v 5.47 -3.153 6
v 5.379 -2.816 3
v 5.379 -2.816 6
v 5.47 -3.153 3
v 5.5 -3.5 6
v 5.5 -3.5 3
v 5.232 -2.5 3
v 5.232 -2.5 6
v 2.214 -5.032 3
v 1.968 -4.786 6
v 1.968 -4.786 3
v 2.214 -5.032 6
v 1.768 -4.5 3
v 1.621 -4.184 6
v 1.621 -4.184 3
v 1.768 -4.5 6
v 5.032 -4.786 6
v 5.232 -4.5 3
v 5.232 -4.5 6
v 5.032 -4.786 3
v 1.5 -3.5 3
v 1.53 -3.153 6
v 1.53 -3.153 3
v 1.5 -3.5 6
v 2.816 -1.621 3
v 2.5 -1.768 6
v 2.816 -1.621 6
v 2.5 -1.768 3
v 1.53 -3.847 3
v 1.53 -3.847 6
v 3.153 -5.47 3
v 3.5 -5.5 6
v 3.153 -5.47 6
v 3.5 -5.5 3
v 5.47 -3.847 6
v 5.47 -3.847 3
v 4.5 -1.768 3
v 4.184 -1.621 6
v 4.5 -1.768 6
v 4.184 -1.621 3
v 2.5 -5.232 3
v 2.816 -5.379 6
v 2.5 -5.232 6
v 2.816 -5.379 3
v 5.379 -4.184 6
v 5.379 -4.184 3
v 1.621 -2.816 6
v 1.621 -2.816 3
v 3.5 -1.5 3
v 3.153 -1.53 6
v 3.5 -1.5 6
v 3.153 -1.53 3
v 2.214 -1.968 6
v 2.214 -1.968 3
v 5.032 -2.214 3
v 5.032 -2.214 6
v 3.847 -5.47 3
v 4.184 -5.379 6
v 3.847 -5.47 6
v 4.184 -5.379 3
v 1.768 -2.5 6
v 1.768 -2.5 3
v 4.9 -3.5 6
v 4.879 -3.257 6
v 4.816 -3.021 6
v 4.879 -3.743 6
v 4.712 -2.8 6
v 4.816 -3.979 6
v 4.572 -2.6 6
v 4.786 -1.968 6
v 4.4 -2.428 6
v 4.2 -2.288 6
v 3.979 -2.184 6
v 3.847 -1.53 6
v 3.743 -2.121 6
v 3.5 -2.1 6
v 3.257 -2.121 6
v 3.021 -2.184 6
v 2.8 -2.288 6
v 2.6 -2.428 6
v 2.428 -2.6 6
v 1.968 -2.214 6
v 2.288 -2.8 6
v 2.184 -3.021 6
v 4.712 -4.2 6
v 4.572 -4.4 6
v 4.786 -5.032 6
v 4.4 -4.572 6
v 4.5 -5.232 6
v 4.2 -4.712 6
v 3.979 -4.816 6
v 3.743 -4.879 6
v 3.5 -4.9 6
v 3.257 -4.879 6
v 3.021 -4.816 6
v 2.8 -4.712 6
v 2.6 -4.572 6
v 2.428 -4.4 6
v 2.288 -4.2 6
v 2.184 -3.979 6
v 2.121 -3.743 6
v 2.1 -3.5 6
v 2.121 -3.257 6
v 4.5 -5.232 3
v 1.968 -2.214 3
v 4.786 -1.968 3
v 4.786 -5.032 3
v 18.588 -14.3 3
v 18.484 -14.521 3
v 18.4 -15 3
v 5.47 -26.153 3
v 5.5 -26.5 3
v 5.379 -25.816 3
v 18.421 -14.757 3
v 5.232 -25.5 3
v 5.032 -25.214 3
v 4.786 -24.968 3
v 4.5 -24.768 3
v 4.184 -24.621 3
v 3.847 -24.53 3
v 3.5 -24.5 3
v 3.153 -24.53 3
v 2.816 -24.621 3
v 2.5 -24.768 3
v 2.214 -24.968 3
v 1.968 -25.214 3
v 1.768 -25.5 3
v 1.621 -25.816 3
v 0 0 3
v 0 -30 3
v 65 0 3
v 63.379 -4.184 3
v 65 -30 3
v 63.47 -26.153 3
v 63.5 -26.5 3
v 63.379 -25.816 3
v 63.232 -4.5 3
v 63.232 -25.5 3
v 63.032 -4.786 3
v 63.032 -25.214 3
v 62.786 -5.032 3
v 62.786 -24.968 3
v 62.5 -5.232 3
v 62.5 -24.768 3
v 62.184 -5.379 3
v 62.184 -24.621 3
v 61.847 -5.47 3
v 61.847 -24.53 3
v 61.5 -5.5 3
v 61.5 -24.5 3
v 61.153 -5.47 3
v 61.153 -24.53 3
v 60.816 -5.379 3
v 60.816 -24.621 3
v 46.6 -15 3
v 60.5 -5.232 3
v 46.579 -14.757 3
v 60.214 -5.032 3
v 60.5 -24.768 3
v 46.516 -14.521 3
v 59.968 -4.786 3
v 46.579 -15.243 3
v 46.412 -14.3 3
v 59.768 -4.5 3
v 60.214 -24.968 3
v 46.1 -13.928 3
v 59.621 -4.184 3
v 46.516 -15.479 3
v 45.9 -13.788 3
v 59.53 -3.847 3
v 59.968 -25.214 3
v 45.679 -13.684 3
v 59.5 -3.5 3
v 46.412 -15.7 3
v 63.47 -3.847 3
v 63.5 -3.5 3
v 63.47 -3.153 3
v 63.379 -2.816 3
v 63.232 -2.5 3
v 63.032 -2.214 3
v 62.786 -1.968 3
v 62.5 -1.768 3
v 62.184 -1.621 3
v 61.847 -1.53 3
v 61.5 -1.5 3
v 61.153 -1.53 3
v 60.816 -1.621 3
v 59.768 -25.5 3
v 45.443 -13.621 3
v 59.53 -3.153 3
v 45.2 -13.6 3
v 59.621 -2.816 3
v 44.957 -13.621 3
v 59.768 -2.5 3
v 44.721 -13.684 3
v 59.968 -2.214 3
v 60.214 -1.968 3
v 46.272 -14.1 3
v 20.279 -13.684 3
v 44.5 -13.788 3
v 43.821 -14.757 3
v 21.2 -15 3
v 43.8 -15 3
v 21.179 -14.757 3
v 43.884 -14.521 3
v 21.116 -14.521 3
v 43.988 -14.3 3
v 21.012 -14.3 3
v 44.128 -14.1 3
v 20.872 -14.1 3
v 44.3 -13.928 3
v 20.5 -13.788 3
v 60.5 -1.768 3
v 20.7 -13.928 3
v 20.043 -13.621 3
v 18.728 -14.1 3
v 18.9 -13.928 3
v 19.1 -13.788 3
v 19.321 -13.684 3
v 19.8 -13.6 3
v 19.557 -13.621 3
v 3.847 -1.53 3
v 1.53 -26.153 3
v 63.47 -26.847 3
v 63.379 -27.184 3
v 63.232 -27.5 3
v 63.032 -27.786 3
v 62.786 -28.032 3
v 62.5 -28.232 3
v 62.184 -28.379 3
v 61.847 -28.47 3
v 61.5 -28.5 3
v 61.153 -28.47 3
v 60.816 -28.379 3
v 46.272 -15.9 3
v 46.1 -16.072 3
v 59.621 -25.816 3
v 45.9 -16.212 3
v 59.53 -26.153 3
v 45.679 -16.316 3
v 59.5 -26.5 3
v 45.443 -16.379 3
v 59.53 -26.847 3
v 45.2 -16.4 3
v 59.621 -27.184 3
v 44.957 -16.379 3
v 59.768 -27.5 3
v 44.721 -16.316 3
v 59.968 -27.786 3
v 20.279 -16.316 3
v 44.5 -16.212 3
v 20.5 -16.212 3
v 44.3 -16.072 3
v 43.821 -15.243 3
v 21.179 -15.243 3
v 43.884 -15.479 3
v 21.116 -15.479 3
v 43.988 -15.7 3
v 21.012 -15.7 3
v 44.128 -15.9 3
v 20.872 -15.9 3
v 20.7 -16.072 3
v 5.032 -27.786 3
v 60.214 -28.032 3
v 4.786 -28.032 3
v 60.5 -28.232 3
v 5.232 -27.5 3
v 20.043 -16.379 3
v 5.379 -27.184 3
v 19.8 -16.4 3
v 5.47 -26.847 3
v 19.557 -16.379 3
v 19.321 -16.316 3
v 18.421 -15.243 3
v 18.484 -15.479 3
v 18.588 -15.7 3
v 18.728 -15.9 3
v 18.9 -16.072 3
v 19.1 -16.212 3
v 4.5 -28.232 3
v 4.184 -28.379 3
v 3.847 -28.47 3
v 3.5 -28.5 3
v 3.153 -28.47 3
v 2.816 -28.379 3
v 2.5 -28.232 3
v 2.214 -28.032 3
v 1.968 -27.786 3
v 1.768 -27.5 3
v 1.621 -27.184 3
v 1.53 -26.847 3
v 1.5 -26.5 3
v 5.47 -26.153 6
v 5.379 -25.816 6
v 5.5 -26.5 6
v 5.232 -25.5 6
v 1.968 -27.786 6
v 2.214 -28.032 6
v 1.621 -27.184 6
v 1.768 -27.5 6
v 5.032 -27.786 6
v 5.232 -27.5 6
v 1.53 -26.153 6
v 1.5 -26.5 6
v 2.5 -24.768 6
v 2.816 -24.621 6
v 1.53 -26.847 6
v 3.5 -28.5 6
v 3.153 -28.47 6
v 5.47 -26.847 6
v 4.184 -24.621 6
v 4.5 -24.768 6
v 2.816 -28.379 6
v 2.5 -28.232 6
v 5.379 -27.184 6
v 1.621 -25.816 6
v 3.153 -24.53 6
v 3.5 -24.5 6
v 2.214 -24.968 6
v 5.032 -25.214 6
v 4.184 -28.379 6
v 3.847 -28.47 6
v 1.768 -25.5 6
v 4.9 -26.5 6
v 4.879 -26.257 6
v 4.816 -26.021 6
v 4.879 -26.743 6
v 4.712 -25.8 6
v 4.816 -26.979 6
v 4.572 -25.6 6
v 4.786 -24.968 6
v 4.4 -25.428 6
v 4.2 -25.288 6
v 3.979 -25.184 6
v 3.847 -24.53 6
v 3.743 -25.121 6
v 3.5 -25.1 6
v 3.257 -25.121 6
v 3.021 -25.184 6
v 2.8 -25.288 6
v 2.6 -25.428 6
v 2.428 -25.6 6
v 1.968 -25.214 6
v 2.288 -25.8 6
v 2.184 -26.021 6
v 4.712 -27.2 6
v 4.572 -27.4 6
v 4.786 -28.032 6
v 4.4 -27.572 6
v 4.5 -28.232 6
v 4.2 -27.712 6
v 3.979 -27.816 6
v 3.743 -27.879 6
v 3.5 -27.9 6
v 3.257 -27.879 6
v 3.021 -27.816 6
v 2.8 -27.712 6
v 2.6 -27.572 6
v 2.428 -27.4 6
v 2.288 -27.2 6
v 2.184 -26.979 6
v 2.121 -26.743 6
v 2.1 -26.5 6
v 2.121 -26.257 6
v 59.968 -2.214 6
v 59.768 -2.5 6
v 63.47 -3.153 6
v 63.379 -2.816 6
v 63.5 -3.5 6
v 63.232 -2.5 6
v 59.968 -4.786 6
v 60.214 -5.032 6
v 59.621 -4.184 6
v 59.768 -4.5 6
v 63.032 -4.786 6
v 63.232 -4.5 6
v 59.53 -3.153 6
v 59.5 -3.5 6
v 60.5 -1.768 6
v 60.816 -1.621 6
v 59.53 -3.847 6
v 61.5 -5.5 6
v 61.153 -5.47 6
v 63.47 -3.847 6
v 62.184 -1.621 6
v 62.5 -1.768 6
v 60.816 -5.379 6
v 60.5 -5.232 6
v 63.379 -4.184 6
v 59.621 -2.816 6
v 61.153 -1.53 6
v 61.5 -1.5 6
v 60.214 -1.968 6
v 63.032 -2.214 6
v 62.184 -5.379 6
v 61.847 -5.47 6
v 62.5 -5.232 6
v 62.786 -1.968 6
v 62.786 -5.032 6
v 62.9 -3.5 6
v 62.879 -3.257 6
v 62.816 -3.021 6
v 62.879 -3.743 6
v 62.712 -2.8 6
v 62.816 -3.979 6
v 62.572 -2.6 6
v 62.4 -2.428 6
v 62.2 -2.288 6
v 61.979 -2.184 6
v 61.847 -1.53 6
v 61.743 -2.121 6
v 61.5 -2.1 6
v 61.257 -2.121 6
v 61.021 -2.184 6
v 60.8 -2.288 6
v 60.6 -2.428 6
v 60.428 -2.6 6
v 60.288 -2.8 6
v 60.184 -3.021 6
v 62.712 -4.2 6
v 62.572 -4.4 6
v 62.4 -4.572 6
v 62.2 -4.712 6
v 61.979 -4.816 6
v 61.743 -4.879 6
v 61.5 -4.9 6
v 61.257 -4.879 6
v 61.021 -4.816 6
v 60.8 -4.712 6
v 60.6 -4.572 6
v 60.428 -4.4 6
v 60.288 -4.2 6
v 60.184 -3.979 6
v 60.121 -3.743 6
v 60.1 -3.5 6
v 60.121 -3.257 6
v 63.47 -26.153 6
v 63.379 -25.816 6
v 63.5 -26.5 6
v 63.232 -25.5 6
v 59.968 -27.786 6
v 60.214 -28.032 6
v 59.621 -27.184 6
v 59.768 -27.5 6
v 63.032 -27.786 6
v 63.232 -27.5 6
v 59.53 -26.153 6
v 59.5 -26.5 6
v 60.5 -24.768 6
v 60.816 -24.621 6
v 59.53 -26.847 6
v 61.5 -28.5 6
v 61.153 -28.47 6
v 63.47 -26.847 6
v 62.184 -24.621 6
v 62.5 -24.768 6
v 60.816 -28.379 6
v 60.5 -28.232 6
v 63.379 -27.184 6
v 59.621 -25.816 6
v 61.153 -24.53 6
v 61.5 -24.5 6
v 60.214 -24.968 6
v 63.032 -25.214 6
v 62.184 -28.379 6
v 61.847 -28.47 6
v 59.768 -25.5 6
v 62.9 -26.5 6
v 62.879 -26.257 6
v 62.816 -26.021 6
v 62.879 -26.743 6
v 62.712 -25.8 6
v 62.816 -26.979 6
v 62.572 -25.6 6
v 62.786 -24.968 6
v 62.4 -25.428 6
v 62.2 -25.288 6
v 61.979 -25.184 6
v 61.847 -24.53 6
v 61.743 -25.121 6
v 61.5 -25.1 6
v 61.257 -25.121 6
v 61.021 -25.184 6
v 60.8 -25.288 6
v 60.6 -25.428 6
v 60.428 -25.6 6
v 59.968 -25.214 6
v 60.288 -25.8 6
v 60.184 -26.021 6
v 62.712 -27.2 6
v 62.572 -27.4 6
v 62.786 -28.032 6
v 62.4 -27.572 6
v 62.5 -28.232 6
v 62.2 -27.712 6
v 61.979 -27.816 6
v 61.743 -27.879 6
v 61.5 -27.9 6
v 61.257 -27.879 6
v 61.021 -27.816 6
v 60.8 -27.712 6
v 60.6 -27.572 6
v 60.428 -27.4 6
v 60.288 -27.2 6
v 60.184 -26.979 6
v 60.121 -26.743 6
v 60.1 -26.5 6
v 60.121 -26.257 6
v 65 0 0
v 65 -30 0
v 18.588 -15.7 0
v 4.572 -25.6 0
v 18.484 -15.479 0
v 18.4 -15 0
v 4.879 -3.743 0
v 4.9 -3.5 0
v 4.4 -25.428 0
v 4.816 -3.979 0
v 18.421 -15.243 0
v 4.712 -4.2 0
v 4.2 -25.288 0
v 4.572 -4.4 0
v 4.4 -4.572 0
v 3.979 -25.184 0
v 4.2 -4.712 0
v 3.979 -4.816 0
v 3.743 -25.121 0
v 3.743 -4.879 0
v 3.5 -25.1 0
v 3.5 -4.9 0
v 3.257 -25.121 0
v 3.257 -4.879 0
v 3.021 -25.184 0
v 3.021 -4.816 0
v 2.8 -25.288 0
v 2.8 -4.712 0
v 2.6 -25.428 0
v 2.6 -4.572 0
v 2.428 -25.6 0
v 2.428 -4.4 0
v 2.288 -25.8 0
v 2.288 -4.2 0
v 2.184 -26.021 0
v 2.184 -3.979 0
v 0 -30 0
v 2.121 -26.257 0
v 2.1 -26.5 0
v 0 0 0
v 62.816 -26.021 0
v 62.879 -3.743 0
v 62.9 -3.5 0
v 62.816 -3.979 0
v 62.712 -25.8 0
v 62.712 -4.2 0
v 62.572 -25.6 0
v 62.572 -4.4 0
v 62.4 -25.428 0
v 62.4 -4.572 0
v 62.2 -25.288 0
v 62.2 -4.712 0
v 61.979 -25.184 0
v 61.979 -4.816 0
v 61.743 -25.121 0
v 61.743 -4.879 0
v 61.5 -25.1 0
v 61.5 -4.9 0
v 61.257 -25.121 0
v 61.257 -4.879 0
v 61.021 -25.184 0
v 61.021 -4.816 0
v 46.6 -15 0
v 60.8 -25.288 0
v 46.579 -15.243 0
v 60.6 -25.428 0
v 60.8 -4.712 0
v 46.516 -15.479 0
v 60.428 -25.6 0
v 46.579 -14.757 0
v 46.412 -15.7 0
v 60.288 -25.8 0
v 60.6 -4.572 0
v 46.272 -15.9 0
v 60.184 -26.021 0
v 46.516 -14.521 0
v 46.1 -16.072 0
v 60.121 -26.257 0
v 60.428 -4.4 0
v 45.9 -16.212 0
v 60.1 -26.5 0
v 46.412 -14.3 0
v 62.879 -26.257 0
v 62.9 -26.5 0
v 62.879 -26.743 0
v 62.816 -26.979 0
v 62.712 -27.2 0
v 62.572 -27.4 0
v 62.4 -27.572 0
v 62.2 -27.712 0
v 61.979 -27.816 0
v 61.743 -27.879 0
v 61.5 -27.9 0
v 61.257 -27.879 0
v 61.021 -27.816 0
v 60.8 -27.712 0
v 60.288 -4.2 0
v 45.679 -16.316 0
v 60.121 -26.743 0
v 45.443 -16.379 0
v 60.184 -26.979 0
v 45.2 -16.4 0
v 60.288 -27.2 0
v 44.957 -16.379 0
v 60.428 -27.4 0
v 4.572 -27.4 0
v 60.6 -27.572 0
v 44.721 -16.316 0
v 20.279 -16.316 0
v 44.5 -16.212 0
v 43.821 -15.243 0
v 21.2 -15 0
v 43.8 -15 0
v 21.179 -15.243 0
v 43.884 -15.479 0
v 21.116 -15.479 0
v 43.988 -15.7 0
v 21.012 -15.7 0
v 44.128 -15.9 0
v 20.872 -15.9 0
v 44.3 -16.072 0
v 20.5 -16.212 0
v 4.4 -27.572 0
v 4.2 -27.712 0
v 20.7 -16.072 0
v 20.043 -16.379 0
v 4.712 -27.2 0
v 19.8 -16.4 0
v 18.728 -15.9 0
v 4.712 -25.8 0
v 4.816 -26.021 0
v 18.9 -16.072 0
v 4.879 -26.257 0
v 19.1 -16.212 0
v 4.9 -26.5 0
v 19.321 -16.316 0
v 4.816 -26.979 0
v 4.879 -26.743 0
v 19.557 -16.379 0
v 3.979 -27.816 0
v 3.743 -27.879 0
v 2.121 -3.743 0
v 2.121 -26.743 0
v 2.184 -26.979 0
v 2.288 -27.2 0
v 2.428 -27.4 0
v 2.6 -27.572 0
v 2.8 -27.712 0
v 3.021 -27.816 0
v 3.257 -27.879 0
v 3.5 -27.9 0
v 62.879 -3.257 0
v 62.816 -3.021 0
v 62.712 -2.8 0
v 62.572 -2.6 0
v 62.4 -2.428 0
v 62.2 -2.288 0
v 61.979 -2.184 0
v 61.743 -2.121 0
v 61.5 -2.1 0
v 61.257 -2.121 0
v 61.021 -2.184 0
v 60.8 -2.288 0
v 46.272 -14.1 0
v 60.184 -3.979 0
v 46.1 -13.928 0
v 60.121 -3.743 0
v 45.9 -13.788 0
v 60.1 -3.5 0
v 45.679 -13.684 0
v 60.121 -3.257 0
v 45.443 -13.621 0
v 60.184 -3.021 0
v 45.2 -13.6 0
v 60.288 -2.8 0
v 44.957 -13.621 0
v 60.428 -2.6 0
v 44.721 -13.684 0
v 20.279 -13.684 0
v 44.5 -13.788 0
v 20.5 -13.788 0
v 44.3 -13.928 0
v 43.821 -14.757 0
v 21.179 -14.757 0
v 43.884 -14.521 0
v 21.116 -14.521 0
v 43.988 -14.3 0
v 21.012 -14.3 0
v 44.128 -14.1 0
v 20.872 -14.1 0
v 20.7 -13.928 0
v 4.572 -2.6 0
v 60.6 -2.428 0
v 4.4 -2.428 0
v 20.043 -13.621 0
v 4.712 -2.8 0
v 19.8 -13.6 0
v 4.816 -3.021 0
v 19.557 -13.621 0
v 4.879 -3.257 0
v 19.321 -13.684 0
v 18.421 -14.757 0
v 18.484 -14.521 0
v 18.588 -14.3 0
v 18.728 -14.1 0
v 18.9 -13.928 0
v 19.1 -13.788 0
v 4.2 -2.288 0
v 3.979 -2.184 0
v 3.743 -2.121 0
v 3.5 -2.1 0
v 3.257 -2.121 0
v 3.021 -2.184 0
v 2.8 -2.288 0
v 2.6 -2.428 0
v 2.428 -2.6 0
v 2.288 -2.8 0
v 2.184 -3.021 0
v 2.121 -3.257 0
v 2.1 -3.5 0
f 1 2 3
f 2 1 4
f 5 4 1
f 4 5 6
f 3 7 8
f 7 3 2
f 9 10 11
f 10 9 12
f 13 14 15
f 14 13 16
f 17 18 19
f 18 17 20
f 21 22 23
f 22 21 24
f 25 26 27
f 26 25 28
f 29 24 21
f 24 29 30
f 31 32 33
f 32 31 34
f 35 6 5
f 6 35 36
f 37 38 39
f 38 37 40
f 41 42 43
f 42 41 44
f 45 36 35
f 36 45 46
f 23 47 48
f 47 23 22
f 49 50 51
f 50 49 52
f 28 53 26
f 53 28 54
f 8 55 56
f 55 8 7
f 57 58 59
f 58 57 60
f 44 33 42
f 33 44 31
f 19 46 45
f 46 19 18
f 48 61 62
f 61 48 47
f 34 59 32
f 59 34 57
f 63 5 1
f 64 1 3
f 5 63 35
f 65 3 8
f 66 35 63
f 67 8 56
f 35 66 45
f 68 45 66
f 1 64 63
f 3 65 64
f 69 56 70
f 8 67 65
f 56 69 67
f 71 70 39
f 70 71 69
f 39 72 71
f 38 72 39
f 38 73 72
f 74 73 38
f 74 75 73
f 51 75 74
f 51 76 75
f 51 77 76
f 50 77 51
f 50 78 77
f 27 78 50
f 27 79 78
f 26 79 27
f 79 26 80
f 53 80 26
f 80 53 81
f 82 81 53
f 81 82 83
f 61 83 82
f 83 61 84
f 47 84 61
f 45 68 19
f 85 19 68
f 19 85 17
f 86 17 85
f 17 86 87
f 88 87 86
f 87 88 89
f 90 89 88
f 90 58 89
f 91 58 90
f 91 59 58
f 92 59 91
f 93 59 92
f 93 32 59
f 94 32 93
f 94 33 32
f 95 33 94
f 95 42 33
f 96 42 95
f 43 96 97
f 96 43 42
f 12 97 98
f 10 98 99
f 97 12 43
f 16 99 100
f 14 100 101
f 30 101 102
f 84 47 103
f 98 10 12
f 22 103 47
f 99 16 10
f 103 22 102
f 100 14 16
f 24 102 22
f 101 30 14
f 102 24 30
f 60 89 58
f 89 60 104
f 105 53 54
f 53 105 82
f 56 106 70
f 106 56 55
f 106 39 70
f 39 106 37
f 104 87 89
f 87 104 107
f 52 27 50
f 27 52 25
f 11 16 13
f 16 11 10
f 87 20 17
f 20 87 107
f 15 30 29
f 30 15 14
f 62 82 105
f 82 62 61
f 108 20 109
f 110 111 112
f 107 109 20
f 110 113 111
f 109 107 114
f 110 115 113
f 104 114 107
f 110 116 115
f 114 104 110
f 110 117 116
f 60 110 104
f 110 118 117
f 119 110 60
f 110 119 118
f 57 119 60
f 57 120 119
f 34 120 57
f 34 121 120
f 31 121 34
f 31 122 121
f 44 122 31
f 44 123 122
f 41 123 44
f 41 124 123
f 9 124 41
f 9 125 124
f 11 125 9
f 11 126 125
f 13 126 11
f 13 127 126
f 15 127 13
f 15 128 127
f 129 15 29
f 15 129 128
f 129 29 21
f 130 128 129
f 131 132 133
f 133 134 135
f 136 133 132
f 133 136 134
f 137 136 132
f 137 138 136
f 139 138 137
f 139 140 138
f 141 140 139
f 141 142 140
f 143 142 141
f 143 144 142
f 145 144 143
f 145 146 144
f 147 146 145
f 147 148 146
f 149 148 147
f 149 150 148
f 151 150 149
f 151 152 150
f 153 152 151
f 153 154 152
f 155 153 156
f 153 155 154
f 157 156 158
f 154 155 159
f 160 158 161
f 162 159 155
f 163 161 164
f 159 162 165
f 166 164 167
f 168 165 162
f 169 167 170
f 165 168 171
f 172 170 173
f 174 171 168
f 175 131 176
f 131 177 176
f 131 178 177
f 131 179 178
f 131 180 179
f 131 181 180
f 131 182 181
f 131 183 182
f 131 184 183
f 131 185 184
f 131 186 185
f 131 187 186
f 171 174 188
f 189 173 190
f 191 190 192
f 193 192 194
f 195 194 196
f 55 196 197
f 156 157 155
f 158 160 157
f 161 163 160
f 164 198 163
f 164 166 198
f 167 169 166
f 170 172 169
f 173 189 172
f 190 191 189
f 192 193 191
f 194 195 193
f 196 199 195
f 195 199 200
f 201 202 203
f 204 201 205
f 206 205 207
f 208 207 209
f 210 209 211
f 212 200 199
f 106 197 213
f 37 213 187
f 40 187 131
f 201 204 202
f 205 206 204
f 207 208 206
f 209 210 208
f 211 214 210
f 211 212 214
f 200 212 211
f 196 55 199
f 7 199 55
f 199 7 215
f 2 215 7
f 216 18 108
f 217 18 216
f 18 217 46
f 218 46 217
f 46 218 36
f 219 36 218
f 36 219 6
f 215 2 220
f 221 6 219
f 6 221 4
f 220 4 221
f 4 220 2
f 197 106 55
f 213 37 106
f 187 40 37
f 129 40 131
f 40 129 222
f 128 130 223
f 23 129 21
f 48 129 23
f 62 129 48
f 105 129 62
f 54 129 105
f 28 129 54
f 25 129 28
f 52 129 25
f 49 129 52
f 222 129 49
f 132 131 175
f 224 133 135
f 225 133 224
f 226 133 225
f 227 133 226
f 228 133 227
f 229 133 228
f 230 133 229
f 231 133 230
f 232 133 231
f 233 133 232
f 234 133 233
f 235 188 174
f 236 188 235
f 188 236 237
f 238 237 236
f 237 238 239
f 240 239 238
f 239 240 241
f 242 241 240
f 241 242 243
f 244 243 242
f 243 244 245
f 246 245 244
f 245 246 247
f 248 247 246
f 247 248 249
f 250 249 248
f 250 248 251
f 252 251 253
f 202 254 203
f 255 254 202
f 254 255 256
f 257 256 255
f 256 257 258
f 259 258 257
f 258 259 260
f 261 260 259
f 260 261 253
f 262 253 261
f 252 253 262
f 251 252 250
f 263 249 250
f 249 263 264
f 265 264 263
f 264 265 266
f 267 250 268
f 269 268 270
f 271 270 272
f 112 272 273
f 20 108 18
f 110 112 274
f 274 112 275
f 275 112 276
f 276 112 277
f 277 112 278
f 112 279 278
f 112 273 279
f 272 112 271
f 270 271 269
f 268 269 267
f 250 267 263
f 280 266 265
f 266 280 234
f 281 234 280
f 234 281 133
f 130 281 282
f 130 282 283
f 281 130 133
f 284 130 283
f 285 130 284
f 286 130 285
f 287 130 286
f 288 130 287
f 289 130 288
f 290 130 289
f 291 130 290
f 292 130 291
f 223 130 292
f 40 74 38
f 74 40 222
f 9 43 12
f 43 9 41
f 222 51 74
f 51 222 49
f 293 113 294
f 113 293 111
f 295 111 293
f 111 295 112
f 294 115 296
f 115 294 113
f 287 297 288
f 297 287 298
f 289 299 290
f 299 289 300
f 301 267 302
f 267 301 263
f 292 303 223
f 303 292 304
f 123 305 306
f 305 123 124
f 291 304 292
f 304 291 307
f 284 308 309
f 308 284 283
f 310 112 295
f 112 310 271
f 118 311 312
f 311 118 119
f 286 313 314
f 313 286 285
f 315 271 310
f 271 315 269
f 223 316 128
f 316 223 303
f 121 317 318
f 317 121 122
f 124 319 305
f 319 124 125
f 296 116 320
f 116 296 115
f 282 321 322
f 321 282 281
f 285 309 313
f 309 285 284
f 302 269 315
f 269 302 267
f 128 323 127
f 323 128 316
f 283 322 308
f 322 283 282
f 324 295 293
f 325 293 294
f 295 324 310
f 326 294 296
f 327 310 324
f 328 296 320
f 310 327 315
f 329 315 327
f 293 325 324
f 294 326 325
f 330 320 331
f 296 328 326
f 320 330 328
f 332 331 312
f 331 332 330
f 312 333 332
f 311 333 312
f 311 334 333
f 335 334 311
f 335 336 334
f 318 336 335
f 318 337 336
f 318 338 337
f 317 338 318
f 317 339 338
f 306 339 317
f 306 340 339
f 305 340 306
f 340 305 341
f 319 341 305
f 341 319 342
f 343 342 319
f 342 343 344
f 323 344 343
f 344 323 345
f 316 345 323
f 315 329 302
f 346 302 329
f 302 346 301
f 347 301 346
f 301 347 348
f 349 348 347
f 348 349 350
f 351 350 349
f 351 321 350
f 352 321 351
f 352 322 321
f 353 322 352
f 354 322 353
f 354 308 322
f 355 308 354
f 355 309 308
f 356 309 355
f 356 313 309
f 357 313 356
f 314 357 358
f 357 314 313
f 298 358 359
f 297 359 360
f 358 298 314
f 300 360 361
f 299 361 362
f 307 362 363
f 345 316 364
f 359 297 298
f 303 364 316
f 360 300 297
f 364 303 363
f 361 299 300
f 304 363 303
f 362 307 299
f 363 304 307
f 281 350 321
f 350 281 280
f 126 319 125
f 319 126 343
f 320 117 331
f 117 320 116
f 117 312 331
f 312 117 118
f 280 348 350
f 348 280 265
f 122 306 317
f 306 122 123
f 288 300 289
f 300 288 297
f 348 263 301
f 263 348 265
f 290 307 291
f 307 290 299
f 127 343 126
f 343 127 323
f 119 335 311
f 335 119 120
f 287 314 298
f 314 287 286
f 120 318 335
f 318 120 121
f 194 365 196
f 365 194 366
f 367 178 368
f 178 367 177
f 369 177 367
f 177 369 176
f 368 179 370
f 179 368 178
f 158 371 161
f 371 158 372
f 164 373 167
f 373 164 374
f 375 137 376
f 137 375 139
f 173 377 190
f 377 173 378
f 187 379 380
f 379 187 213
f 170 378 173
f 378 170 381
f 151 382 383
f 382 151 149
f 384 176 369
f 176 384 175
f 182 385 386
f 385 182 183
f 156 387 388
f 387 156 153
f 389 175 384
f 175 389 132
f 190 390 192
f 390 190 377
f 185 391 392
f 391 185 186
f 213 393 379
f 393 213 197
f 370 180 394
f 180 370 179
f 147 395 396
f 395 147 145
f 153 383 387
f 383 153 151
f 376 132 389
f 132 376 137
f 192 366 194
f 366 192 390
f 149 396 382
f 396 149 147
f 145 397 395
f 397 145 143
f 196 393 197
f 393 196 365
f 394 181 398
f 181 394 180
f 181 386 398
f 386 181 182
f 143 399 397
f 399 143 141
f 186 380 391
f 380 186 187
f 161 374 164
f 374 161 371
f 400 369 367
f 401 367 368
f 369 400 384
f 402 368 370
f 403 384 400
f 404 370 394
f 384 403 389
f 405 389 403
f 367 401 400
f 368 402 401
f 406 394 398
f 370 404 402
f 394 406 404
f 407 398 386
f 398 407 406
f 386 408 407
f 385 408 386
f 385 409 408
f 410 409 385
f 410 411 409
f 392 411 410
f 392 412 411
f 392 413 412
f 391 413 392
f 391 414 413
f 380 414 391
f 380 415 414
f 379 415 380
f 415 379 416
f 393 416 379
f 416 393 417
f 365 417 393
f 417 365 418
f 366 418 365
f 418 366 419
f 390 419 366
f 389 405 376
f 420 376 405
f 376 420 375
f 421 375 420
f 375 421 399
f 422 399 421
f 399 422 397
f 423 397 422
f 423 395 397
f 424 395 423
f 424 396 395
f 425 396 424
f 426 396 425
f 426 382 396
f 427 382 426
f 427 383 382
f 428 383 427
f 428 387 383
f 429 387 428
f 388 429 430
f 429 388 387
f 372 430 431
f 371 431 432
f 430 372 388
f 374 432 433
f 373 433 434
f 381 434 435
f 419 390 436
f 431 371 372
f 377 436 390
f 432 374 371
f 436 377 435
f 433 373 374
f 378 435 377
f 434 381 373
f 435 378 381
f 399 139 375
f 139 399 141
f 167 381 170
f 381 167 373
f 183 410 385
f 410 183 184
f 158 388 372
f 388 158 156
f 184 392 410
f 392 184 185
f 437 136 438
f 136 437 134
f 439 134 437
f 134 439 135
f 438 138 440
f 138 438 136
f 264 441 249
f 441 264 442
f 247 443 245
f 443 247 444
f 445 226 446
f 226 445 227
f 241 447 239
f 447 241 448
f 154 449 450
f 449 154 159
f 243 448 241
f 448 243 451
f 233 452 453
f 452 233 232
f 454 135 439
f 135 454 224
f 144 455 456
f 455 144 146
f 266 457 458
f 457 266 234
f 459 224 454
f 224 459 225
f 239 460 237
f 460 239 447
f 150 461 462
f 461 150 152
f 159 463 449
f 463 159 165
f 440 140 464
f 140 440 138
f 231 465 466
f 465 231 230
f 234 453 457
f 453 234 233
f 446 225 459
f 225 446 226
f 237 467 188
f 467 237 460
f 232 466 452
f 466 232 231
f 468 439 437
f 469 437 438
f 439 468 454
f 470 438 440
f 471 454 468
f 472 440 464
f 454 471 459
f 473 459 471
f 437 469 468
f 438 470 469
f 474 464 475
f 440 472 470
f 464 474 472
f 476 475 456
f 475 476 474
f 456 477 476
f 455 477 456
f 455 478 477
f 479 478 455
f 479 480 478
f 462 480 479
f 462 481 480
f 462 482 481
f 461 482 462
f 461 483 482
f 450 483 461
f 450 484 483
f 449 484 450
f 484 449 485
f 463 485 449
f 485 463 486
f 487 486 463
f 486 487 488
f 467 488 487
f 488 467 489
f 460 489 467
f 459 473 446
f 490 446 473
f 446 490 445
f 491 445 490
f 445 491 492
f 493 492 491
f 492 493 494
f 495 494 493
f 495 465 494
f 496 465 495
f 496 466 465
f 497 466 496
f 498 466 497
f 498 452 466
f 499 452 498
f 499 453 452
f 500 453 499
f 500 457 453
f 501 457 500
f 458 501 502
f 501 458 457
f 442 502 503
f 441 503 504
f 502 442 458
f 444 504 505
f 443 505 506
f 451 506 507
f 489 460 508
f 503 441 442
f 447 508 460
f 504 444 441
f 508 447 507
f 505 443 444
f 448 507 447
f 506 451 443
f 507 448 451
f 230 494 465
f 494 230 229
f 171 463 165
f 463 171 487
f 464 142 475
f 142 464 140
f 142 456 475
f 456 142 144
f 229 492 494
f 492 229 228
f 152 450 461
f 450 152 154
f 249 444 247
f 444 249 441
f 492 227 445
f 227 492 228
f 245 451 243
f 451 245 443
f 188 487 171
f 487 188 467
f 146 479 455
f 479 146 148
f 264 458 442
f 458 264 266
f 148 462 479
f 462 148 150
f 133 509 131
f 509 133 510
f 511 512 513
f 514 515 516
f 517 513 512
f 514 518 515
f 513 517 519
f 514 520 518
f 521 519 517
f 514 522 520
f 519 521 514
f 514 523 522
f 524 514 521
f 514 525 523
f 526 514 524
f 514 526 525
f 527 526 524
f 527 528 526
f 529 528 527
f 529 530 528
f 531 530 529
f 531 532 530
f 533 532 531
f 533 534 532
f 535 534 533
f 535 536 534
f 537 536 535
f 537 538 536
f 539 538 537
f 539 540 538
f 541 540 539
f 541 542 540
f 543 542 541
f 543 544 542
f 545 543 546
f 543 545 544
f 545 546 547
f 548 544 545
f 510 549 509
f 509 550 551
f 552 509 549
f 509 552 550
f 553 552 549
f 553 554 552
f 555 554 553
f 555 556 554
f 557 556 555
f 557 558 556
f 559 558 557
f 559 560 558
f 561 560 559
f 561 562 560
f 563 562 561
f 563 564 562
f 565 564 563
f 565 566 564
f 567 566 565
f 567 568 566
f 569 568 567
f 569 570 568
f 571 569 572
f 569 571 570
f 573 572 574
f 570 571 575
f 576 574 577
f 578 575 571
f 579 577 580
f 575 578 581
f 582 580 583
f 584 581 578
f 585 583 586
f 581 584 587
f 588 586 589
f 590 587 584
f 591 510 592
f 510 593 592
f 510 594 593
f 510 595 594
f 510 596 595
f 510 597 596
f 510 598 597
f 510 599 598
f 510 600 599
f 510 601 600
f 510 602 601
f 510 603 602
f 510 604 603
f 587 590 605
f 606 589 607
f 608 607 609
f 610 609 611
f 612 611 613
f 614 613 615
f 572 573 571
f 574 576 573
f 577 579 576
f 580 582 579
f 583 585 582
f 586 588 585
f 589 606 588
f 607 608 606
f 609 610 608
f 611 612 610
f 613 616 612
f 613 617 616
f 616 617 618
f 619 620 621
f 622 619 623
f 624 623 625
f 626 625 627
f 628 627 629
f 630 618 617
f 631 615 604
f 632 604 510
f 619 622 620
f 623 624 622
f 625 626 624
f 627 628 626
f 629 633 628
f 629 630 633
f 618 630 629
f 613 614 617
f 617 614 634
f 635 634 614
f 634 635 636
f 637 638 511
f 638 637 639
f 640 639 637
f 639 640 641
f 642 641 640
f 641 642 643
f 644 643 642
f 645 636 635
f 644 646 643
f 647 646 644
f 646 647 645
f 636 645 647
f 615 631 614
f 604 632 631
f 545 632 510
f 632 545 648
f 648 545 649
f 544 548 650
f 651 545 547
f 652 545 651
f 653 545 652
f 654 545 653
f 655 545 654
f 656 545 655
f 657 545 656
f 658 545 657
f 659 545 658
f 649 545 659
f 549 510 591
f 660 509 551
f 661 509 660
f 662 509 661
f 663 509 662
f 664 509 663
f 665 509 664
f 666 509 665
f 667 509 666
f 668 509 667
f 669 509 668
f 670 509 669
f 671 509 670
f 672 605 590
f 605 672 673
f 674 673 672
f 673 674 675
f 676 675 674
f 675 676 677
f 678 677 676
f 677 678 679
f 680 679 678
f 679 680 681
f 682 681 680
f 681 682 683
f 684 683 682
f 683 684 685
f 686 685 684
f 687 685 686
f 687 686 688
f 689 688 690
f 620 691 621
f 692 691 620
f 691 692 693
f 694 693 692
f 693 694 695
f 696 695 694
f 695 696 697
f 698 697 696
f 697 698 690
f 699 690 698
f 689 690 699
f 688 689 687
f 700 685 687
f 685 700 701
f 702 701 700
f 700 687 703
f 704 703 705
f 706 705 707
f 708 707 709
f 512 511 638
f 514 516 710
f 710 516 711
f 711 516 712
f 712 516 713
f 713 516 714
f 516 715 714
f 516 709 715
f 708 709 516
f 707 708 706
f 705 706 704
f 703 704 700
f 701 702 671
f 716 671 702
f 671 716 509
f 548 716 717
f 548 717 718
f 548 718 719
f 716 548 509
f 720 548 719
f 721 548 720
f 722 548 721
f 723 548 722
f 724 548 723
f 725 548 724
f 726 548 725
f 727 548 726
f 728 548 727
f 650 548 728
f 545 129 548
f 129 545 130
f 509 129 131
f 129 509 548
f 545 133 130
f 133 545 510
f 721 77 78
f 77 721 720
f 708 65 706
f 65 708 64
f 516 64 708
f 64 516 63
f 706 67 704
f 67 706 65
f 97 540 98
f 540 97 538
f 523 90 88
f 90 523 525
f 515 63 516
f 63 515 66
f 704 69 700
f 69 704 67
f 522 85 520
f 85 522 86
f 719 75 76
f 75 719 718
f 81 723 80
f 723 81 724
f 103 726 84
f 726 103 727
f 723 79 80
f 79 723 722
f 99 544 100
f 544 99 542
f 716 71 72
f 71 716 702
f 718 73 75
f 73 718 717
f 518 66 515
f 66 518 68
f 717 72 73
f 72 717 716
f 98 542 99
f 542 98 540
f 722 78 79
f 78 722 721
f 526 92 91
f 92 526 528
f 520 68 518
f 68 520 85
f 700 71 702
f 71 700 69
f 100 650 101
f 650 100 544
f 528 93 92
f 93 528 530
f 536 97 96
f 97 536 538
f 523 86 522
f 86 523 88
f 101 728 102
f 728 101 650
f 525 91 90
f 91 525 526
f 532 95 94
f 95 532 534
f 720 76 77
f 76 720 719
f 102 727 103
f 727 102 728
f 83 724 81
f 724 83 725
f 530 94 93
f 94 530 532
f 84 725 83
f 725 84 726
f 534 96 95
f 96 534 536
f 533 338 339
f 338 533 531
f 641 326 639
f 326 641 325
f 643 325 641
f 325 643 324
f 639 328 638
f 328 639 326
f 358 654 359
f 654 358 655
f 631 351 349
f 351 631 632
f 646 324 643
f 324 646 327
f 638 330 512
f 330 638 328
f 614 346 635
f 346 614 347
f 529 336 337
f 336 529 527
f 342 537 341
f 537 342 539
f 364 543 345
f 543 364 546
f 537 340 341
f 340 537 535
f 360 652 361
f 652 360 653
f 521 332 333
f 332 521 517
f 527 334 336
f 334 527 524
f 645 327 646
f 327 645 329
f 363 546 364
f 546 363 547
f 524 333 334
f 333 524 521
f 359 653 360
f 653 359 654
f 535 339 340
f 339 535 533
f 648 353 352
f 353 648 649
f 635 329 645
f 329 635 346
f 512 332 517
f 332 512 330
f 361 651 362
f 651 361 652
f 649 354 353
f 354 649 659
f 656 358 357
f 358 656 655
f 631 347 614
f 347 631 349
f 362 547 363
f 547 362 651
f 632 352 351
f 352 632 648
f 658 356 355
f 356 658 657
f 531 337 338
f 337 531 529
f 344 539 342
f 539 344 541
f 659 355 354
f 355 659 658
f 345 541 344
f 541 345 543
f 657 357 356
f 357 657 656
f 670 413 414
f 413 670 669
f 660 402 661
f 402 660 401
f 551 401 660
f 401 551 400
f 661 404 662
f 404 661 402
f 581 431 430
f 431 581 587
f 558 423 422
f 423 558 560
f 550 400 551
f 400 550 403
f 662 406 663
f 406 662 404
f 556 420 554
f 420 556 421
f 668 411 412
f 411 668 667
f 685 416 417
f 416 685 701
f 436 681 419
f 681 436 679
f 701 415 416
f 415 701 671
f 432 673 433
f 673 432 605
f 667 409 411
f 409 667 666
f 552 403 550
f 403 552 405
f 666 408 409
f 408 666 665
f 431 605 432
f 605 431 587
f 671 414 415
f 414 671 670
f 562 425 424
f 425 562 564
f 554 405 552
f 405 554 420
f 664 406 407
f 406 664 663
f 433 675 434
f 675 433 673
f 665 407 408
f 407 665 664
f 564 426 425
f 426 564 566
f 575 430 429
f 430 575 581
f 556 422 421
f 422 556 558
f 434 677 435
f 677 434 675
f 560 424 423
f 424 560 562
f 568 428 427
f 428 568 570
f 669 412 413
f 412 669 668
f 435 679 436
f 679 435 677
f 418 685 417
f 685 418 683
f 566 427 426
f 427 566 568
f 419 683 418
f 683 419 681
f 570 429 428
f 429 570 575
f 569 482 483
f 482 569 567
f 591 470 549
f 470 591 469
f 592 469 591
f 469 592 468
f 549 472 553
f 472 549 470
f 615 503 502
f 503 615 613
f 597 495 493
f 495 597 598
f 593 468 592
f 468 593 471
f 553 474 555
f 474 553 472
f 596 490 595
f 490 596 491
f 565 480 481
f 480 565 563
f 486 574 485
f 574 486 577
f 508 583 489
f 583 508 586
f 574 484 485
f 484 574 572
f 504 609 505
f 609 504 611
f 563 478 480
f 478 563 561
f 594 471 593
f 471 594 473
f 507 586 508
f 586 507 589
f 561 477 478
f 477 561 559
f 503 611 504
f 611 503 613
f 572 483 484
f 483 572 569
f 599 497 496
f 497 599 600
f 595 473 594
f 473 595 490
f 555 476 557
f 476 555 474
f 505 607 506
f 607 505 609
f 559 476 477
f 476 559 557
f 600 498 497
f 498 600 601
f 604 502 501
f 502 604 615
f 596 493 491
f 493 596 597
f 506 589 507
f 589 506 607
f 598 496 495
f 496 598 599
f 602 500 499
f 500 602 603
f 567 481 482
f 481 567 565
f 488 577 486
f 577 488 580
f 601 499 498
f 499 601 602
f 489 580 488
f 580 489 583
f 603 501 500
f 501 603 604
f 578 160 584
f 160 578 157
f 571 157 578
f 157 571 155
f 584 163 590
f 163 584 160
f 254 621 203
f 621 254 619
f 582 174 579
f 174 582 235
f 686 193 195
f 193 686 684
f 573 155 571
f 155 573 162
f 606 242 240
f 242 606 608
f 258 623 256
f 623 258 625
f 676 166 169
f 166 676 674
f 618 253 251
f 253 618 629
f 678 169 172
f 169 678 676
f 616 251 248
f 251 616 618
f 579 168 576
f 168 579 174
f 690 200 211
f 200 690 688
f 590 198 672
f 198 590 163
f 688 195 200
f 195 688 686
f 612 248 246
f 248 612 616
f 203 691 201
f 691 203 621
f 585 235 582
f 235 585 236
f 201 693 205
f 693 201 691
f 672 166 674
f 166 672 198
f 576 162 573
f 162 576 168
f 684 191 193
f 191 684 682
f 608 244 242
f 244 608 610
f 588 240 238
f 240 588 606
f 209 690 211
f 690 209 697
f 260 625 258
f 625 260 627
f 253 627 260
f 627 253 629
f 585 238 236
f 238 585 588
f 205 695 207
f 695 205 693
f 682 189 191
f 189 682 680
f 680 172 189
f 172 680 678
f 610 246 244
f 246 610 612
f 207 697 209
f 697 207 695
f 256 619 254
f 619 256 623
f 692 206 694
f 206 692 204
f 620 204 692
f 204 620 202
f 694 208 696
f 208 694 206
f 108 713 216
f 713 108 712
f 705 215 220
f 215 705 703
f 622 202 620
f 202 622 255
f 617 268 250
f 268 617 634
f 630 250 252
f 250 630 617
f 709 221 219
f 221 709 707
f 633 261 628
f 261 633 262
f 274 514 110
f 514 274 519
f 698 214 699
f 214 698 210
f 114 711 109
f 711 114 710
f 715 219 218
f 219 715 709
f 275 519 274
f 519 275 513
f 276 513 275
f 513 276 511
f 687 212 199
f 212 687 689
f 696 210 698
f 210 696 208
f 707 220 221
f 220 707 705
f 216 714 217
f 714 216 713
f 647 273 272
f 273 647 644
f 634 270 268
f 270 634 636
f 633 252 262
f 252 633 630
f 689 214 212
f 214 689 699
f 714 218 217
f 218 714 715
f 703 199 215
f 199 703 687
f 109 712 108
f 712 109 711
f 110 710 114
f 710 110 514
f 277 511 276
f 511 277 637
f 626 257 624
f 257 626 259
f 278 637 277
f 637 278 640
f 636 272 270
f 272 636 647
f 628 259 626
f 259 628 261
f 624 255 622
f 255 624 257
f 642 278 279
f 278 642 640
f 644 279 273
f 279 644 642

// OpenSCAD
//
// Raspberry Pi Zero 2W
//
// RaspberryPiZero2W-1-20250516A.scad
//
// https://www.raspberrypi.com/documentation/computers/raspberry-pi.html
//
// Last update: 2025-05-16(Fri) 05:55 JST / 2025-05-15(Thu) 20:55 UTC
// Last update: 2025-05-25(Sun) 08:08 JST / 2025-05-24(Sat) 23:08 UTC
//

Px = 65.0; Py = -30.0; Pz = 3.0;    // パネルの 横・縦・厚さ （P は "Panel" の P）
Cd = 4.0;  Cz = 3.0;                // 円柱の直径、厚さ （Cは "Cylinder" の C）
H1d = 2.8; H2d = 2.8;               // 穴1,穴2の直径 （H は "Hole" の H）

// 穴1の位置リスト
hole1_pos = [
    [ 3.5,   -3.5 ],
    [ 3.5,  -26.5 ],
    [ 61.5,  -3.5 ],
    [ 61.5, -26.5 ]
];

// 穴2の位置リスト
hole2_pos = [
  [ Px/2 + 12.7, Py/2 ],
  [ Px/2 - 12.7, Py/2 ],
];



difference() {
    // (1) まず、4本の円柱を持つ直方体のパネルを作る
    union() {
        // パネルを用意
        // cube([Px, -Py, Pz]); // 第1章限で造形する場合
        translate([0, Py, 0]) cube([Px, -Py, Pz]);  // 第4象限で造形する場合
        // 円柱を4本立てる
        for (pos = hole1_pos) {
            x = pos[0]; y = pos[1];
            translate([x, y, Pz]) cylinder(h = Cz, d = Cd, $fn = 36);
        }
    }
    // (2) 次に、それぞれの円柱に穴1を貫通させる
    for (pos = hole1_pos) {
        x = pos[0]; y = pos[1];
        translate([x, y, -1.0]) cylinder(h = Pz + Cz + 2.0, d = H1d, $fn = 36);
        // 確実に穴をあけるため、パネル厚+円柱厚より2mm長い円柱をパネル底面より1mm沈めて配置
    }
    // (3) 最後に、パネルに穴2を貫通させる
    for (pos = hole2_pos) {
        x = pos[0]; y = pos[1];
        translate([x, y, -1.0]) cylinder(h = Pz + 2.0, d = H2d, $fn = 36);
        // 確実に穴をあけるため、パネル厚+円柱厚より2mm長い円柱をパネル底面より1mm沈めて配置
    }
}
